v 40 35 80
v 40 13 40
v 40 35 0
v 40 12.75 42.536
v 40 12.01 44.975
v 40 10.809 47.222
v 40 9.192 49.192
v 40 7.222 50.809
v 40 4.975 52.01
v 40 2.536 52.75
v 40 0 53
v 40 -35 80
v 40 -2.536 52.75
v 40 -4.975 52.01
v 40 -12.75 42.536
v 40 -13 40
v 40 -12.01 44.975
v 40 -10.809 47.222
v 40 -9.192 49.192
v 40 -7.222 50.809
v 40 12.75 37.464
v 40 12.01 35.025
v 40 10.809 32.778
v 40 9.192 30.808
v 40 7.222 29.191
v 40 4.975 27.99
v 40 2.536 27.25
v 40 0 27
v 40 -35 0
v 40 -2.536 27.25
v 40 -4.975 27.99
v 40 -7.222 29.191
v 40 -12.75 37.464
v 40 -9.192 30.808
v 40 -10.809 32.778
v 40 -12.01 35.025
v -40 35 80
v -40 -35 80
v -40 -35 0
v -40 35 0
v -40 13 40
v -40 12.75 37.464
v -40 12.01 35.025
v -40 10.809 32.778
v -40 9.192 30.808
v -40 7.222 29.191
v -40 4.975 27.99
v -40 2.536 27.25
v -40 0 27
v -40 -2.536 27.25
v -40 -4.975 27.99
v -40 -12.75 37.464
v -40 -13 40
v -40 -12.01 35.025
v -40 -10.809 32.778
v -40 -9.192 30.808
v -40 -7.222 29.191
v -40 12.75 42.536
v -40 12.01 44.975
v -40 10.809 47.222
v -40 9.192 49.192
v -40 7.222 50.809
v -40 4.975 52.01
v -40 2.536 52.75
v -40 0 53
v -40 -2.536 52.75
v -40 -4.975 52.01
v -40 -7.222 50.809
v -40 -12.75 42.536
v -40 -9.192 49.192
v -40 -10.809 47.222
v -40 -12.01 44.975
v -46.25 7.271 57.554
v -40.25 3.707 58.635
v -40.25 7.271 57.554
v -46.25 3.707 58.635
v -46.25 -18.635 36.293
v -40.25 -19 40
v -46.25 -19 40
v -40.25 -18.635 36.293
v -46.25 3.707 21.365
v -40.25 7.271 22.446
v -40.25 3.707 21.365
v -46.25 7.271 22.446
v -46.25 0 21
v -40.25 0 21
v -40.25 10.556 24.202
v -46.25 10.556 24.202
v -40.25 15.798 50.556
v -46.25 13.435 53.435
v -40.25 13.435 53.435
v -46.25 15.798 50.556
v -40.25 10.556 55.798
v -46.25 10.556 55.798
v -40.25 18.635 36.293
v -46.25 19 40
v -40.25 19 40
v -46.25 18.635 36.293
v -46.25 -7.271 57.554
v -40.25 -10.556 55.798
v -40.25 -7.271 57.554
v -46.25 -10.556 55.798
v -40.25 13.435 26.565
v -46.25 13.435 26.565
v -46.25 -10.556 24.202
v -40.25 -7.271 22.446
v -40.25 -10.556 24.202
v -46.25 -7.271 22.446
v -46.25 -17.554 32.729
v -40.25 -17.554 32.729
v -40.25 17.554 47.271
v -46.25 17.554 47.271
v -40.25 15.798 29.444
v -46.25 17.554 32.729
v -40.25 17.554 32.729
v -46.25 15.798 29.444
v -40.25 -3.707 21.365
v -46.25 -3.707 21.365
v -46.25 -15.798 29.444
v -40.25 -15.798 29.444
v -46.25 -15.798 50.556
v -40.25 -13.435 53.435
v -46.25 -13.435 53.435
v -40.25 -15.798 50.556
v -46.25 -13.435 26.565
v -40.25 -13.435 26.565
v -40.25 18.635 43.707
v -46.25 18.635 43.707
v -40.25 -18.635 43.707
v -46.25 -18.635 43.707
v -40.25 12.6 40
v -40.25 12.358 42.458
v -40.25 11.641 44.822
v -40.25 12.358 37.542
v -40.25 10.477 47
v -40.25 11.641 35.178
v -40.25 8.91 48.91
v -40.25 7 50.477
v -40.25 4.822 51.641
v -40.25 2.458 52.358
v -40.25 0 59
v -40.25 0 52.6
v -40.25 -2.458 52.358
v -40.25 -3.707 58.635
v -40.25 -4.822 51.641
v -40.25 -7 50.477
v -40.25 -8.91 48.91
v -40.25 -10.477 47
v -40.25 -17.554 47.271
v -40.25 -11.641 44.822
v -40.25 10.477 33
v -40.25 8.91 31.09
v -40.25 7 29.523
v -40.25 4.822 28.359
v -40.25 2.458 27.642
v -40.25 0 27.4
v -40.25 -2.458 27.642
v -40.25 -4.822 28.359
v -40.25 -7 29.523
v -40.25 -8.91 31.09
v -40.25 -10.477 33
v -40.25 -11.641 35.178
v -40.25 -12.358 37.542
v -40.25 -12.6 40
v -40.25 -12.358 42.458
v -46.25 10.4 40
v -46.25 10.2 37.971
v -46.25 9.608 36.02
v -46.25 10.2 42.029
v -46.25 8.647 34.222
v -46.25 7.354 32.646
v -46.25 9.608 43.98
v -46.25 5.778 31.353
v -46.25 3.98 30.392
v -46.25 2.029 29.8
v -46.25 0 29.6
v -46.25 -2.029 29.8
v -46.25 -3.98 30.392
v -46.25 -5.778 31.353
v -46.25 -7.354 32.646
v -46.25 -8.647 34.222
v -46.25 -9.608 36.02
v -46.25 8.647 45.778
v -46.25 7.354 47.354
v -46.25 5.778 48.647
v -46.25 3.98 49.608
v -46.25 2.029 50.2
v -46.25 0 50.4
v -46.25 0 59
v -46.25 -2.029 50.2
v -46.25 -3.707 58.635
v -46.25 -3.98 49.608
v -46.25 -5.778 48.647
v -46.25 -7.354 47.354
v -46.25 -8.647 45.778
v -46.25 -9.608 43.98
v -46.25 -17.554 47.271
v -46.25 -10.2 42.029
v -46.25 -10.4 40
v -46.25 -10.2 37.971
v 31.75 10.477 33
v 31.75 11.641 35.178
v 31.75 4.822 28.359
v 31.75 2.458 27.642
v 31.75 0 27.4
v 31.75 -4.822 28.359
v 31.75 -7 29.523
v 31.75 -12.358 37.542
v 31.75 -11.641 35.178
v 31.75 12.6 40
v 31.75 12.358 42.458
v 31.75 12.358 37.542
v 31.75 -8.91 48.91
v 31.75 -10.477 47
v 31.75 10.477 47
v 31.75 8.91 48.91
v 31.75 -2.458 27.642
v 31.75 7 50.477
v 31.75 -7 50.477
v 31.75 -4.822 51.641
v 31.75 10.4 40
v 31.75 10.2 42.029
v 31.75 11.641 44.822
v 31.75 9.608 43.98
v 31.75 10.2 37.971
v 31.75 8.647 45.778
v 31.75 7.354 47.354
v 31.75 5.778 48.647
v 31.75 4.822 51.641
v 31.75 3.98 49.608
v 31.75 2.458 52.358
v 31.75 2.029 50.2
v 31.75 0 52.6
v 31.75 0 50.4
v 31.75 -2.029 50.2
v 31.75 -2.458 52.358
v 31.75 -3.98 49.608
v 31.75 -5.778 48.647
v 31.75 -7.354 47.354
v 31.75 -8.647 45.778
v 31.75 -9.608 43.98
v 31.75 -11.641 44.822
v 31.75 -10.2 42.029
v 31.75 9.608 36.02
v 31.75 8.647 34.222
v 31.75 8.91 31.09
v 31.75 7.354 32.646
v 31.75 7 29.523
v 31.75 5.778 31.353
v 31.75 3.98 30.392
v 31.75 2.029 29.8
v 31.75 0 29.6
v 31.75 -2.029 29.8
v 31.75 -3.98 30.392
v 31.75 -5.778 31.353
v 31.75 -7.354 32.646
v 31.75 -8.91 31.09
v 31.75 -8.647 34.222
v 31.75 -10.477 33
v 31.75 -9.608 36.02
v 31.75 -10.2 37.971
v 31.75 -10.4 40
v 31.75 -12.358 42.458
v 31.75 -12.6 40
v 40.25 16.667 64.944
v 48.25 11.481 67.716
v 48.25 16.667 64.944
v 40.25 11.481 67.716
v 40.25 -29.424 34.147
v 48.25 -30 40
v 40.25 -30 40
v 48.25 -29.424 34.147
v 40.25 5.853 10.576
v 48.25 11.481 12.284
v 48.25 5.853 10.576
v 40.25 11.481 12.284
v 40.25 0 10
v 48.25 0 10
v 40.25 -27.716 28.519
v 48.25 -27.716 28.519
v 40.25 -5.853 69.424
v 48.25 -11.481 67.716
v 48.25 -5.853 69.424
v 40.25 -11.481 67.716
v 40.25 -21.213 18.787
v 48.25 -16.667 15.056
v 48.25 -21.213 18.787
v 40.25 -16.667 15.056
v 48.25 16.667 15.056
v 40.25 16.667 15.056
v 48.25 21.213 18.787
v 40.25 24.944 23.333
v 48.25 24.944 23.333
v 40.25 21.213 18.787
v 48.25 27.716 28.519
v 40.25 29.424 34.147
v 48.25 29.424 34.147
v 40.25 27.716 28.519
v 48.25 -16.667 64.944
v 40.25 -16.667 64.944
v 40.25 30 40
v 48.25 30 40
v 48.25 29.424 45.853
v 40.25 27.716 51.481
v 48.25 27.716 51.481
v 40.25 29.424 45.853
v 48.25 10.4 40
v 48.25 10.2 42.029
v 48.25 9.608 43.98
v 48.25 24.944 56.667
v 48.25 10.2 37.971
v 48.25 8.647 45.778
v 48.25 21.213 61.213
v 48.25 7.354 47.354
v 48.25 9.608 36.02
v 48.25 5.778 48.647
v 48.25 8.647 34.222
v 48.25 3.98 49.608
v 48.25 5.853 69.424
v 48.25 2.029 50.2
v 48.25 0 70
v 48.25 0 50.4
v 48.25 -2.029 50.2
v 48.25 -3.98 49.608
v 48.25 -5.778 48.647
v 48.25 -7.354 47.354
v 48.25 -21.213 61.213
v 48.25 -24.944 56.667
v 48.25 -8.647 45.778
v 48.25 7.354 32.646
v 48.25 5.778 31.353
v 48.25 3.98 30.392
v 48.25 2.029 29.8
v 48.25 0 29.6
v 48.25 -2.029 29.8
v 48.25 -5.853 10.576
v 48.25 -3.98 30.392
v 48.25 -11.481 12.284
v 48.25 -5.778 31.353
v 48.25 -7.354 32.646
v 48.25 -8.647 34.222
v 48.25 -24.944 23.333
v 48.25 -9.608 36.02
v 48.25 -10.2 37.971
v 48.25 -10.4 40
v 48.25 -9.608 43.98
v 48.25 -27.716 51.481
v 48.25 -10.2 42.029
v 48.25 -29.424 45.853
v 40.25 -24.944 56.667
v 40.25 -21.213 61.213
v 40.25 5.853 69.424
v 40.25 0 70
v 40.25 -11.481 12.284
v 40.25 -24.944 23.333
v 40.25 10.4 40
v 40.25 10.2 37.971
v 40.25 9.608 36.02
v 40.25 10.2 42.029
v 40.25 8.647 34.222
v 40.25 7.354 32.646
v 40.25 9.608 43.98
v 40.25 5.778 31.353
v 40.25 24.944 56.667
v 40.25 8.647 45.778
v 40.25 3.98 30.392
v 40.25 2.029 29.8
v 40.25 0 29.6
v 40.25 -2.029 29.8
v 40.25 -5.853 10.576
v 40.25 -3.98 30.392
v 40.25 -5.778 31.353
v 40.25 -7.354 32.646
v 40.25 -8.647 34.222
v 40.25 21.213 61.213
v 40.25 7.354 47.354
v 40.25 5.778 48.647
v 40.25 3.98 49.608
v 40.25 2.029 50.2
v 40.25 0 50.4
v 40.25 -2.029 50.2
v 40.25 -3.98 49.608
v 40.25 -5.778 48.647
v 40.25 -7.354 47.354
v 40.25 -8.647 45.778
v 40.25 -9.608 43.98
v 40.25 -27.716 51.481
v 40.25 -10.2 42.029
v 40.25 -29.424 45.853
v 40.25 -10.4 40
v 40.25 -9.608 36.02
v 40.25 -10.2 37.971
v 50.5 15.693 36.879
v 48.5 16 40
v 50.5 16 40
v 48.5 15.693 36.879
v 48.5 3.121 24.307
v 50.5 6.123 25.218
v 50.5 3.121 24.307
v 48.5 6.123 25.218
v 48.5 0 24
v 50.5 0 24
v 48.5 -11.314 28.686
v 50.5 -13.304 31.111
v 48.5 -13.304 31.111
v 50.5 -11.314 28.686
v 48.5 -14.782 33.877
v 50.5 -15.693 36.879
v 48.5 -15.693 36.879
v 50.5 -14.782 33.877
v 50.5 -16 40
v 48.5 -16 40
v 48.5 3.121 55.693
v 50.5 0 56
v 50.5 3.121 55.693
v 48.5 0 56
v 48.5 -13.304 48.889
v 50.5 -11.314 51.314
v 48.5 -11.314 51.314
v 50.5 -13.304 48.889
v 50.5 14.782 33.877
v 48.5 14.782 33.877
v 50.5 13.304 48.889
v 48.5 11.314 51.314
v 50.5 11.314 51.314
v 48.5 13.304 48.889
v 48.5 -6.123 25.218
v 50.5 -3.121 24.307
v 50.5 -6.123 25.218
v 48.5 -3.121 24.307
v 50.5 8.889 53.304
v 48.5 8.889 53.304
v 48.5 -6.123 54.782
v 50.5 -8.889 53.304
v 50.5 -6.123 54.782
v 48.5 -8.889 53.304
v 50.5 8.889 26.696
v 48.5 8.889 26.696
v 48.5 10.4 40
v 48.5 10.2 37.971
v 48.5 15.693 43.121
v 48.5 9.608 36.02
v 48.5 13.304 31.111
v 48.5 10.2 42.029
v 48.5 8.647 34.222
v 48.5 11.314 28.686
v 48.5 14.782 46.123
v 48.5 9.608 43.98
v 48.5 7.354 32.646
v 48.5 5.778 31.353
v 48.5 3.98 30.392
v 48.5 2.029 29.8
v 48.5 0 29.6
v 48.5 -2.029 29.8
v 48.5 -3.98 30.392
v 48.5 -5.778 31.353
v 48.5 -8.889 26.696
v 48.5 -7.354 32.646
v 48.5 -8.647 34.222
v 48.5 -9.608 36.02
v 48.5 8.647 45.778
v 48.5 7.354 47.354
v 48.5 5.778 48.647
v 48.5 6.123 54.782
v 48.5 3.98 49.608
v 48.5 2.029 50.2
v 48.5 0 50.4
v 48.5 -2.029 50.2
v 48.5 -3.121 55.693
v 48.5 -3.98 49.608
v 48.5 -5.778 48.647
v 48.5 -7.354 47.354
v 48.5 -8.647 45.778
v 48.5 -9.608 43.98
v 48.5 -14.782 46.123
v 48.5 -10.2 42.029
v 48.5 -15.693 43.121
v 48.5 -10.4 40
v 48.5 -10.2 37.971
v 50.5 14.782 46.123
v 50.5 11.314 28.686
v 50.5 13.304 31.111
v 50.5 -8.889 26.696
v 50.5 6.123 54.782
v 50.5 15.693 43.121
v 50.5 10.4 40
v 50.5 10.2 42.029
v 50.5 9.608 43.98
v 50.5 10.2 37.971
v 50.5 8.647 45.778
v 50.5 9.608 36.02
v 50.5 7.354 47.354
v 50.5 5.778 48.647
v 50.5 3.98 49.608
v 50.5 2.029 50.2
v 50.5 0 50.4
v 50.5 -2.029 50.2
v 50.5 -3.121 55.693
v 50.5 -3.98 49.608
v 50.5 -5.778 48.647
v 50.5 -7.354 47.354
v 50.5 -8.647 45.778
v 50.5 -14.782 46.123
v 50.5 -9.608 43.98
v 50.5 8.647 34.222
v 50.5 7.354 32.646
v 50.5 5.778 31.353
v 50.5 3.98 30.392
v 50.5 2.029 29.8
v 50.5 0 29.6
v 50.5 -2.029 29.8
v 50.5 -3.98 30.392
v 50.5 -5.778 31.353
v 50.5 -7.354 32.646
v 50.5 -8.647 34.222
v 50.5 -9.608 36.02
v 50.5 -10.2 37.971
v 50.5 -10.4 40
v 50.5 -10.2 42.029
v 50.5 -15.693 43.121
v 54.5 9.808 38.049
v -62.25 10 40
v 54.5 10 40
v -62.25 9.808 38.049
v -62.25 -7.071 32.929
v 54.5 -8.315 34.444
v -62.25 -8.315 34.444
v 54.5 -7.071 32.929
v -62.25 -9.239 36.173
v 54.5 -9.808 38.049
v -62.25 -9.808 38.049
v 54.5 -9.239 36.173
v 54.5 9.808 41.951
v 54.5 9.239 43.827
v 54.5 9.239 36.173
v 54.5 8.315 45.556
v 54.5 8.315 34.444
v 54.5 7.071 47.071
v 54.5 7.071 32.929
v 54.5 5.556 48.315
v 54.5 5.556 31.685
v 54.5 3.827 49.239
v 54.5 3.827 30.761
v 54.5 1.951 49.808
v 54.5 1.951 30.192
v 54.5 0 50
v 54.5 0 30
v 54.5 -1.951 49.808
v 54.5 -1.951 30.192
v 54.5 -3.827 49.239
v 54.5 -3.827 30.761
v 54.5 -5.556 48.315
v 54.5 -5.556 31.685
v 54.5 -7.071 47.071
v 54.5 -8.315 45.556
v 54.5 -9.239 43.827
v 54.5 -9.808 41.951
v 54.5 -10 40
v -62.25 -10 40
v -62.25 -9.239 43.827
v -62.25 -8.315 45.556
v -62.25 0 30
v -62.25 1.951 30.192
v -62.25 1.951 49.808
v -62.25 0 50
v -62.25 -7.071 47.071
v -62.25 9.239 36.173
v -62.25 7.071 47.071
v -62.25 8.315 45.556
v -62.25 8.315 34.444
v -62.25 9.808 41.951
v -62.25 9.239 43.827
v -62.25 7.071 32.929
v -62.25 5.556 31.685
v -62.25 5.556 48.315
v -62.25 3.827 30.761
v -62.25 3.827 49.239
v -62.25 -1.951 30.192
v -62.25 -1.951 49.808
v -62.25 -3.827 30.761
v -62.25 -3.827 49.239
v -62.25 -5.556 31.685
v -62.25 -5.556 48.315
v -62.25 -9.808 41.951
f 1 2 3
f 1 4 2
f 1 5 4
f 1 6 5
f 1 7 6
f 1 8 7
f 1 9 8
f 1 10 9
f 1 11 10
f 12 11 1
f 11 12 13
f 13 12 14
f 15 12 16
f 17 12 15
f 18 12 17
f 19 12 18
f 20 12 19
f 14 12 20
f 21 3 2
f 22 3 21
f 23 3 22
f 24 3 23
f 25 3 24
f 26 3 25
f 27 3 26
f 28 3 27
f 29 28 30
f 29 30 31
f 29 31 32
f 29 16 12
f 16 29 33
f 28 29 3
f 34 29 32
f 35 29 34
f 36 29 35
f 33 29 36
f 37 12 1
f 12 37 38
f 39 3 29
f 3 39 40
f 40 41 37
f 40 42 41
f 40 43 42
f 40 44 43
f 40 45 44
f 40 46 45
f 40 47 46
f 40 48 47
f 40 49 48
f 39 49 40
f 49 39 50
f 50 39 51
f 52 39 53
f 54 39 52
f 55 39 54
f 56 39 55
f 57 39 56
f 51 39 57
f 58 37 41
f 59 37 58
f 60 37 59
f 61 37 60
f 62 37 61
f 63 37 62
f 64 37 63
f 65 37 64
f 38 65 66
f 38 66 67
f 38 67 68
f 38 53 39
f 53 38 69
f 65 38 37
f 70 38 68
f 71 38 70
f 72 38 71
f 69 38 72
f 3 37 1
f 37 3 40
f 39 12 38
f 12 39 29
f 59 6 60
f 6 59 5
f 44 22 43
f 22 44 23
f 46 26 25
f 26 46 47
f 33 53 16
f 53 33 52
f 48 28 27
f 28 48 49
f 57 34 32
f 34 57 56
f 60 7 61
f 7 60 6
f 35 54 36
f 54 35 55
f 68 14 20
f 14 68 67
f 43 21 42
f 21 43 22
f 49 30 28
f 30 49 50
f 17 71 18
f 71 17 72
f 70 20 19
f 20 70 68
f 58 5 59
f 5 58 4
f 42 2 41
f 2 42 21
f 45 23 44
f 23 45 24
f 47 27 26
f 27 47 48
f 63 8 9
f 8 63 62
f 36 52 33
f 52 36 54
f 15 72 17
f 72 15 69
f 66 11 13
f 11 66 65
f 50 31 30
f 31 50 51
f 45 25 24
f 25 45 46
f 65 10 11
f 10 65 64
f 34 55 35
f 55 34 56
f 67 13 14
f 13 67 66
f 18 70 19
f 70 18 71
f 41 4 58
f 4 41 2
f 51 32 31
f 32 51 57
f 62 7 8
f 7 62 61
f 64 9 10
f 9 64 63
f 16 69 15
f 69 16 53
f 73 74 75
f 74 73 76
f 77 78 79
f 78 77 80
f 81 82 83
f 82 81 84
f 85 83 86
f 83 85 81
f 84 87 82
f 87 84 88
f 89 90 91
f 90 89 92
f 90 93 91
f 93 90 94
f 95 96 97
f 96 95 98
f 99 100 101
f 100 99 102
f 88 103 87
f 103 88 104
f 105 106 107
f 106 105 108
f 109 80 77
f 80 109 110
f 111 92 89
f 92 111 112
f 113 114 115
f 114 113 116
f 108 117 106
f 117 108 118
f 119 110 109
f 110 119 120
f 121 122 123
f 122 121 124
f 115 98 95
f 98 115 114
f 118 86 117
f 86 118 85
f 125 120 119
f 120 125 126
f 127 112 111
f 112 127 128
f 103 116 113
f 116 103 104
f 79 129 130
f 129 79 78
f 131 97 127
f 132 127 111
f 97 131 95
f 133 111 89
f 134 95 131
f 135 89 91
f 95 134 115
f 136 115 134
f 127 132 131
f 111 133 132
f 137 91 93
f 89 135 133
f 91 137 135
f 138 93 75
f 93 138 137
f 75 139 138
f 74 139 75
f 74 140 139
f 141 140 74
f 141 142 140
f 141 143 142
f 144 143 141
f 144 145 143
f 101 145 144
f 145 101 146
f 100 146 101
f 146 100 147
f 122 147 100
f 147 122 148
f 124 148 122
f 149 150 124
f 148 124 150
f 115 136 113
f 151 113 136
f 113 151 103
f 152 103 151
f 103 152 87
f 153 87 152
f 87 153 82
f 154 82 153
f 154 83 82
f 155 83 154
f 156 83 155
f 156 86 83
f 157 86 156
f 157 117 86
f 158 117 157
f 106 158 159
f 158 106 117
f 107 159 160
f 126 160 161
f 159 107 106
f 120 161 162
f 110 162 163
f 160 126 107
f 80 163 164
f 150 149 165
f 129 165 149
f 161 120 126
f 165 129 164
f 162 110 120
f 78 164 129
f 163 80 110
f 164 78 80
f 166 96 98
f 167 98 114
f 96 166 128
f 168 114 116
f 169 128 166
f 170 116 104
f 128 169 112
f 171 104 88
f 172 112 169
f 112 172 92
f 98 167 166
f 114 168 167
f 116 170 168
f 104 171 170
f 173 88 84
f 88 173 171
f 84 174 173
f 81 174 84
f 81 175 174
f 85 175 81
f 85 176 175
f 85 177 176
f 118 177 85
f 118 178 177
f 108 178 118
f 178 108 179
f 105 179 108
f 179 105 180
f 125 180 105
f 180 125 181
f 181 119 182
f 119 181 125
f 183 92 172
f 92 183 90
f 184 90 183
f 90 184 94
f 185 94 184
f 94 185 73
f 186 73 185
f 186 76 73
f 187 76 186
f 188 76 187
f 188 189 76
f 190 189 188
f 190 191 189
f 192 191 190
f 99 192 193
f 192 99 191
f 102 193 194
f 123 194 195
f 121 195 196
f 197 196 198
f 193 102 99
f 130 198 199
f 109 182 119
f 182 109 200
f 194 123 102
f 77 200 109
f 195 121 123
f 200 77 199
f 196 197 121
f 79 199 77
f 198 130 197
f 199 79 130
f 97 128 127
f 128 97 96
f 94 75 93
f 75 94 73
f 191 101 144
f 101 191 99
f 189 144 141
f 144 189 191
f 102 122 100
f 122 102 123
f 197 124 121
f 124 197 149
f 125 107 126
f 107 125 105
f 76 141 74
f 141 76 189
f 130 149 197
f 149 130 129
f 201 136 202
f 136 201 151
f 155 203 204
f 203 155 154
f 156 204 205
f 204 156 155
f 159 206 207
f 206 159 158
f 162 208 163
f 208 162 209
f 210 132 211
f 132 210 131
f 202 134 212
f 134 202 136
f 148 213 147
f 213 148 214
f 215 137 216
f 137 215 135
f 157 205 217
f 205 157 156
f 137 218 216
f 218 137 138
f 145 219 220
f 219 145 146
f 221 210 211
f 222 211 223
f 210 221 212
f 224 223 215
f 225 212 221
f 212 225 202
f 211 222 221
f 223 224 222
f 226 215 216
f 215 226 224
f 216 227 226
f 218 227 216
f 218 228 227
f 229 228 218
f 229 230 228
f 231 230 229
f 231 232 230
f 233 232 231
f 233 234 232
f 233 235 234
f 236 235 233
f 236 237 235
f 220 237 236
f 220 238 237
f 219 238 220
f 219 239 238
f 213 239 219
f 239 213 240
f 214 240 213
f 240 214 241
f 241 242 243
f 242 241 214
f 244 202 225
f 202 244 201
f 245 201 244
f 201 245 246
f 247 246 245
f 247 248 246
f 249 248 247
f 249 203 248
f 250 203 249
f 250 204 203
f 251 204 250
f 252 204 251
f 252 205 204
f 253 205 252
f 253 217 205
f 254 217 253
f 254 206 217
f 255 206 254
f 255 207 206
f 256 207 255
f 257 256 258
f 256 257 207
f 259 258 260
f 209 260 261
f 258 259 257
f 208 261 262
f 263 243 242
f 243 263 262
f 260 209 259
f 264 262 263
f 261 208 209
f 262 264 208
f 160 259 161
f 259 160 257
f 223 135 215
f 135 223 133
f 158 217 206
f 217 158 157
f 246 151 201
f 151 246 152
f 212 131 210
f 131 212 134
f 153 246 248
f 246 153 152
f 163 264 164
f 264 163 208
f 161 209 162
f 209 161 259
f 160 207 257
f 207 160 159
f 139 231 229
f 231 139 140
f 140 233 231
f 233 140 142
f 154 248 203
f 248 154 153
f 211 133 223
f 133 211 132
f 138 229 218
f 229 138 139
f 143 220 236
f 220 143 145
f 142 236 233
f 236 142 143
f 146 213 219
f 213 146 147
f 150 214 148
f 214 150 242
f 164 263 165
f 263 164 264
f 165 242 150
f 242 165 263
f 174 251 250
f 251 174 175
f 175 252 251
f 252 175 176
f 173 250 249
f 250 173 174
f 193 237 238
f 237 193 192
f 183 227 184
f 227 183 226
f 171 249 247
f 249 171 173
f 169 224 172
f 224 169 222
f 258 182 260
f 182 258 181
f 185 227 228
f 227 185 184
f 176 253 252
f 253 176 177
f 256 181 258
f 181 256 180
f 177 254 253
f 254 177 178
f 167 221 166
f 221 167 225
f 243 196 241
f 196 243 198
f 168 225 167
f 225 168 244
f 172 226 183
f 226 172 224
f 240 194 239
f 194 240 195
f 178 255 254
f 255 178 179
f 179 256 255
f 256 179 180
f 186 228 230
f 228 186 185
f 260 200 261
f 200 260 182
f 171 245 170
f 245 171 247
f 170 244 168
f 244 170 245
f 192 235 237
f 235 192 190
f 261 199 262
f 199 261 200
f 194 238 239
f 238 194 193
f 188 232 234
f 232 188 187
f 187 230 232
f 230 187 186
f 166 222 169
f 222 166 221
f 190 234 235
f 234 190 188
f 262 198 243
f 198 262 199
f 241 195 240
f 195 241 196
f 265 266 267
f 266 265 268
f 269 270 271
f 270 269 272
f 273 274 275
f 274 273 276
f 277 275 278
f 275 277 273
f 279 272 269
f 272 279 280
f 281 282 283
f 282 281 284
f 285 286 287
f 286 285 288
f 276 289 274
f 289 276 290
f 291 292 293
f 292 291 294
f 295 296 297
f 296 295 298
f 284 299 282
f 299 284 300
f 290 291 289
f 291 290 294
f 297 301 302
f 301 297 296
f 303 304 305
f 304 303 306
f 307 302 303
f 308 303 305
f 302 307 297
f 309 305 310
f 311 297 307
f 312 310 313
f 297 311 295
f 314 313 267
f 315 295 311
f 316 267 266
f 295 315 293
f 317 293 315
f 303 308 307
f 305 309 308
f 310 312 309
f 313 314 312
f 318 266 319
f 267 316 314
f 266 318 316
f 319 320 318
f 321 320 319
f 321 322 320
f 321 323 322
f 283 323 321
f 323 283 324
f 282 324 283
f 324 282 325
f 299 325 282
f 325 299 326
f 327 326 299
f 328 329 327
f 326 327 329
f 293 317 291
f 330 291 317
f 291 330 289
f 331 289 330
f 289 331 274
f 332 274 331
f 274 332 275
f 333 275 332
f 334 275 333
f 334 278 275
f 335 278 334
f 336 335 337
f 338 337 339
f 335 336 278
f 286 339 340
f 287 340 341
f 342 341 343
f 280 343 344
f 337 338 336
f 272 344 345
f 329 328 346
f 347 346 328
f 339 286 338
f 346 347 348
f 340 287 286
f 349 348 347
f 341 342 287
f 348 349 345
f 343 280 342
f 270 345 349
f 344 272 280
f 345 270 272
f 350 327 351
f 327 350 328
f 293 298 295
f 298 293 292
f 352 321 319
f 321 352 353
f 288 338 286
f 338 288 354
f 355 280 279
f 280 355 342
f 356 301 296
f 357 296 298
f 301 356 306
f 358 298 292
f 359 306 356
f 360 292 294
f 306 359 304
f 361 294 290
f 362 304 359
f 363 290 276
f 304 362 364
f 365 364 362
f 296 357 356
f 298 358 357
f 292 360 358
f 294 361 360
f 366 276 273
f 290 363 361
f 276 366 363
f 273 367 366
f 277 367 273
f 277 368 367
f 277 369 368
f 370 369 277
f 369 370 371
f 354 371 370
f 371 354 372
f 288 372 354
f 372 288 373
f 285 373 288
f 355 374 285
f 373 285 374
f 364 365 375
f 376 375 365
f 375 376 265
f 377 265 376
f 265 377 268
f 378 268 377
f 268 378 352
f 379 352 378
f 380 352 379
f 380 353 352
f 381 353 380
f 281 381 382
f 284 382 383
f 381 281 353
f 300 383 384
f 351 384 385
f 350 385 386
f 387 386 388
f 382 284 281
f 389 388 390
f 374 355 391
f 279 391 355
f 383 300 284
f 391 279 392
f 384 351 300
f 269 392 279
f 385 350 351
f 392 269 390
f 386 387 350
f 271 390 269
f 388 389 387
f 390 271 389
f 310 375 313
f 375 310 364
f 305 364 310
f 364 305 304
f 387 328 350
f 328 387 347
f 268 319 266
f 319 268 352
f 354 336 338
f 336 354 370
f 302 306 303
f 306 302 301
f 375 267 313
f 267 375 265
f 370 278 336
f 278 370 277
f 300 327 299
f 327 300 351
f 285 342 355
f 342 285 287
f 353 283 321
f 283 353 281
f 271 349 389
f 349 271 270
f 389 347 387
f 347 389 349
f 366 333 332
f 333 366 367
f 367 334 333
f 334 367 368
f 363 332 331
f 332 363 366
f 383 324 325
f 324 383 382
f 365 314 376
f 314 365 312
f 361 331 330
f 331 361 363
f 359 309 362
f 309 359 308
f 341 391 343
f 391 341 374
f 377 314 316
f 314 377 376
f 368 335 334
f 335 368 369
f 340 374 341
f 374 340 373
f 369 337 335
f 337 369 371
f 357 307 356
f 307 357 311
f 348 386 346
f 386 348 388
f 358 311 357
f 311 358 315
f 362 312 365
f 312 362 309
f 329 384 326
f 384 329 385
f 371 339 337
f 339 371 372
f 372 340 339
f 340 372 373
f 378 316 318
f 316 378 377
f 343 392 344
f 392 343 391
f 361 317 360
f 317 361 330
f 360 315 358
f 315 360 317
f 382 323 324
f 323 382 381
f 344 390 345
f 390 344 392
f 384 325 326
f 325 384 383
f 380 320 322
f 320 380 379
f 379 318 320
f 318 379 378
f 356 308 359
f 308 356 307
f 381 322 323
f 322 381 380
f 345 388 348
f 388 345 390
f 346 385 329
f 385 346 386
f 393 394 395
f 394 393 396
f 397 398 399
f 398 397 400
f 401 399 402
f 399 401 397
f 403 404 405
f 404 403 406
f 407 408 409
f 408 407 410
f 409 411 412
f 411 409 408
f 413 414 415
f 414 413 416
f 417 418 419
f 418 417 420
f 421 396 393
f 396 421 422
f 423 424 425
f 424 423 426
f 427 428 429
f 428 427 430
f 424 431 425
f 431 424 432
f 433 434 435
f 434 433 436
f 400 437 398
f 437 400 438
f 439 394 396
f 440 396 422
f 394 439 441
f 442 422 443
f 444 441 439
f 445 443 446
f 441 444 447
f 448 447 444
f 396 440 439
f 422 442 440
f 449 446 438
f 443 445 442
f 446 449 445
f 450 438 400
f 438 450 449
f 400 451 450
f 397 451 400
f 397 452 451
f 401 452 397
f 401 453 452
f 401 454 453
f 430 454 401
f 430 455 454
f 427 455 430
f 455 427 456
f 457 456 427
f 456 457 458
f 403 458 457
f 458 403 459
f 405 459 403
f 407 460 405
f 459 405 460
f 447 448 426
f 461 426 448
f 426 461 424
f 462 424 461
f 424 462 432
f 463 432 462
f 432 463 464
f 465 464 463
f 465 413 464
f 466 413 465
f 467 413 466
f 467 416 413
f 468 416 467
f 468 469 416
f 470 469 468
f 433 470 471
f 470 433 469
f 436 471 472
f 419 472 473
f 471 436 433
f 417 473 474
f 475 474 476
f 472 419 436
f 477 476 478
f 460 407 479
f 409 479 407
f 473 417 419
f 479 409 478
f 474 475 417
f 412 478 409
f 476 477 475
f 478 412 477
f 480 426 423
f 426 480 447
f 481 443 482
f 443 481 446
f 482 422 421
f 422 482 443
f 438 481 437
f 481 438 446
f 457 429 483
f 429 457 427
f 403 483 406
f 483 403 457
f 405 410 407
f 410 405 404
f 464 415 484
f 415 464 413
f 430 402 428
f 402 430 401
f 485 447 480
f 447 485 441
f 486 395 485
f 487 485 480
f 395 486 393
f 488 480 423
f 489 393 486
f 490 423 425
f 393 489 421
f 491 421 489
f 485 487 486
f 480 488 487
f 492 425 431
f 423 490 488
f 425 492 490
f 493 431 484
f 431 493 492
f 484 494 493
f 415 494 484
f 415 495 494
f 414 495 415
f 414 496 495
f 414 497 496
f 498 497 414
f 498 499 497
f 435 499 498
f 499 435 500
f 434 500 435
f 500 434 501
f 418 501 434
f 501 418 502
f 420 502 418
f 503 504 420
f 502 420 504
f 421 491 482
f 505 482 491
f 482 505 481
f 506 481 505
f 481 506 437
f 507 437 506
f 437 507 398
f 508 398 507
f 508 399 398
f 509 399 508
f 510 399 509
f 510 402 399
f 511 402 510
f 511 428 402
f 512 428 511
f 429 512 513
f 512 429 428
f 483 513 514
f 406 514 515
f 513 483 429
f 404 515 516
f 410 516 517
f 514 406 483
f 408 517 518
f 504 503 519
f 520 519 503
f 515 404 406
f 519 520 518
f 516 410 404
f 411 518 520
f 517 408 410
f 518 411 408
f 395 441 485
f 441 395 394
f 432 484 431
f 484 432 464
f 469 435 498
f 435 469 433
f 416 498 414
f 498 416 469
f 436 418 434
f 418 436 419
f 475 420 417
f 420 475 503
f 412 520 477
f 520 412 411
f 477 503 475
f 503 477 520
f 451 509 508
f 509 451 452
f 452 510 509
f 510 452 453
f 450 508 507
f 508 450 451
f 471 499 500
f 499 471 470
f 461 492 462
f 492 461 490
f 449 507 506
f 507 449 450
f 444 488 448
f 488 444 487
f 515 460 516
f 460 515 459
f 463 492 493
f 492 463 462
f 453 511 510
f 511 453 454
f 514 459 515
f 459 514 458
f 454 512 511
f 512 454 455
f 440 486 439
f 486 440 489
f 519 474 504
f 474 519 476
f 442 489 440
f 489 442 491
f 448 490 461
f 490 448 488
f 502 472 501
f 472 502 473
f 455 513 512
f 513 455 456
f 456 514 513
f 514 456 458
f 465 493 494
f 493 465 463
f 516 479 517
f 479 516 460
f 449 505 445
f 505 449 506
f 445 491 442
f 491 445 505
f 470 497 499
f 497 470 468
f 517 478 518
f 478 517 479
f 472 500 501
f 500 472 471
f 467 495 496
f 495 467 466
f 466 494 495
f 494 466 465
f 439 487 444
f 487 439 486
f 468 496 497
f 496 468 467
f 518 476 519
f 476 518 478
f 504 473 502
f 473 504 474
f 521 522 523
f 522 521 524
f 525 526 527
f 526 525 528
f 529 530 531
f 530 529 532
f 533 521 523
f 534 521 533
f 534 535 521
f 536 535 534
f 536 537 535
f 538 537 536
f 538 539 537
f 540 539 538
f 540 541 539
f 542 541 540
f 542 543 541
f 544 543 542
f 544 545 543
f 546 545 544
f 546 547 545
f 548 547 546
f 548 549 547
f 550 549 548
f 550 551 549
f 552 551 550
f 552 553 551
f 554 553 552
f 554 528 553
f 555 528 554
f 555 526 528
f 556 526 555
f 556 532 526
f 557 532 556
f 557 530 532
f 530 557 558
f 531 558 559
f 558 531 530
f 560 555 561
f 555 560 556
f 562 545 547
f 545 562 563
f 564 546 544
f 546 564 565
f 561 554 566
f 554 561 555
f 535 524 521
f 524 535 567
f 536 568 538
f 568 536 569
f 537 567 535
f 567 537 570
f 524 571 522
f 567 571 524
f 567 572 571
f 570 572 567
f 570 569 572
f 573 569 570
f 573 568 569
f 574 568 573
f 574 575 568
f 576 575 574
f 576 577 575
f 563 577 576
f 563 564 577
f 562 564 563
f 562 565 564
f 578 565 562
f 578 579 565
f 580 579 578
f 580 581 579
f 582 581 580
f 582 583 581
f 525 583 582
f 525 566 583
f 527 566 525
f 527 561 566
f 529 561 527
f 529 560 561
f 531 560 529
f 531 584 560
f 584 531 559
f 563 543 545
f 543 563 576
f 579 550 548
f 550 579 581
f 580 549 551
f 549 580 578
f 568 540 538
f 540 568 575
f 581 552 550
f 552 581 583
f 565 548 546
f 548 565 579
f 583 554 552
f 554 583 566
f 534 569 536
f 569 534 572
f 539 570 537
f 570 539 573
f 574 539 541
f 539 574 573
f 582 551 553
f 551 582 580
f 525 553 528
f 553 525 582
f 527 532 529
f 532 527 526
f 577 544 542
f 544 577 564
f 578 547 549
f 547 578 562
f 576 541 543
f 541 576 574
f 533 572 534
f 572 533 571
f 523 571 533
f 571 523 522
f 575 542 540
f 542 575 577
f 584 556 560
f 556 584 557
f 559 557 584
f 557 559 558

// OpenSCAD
$fn = 32;

// ------------------------------------------------------------------------
// Bushed housing: 80 x 70 x 80 mm housing, bushing d25.2
// Every part is its own module, assembly() places them once.
// ------------------------------------------------------------------------

// --- part 1 ---
module housing() {
  difference() {
    translate([-40, -35, 0]) cube([80, 70, 80]);
    translate([0, 0, 40]) rotate([0, 90, 0]) cylinder(h = 82, d = 26, center = true);
  }
}

// --- part 2 ---
module bushing() {
  difference() {
    union() {
      cylinder(h = 6, d = 38);
      translate([0, 0, 6]) cylinder(h = 72, d = 25.2);
    }
    translate([0, 0, -1]) cylinder(h = 80, d = 20.8);
  }
}

// --- part 3 ---
module shaft() {
  translate([0, 0, -58.375]) cylinder(h = 116.75, d = 20);
}

// --- part 4 ---
module cover() {
  difference() {
    cylinder(h = 8, d = 60);
    translate([0, 0, -1]) cylinder(h = 10, d = 20.8);
  }
}

// --- part 5 ---
module washer() {
  difference() {
      translate([0, 0, 0]) cylinder(h = 2, d = 32);
      translate([0, 0, -1]) cylinder(h = 4, d = 20.8);
    }
}

// --- assembly ---
module assembly() {
  translate([0, 0, 0]) rotate([0, 0, 0]) housing();
  translate([-46.25, 0, 40]) rotate([0, 90, 0]) bushing();
  translate([-3.875, 0, 40]) rotate([0, 90, 0]) shaft();
  translate([40.25, 0, 40]) rotate([0, 90, 0]) cover();
  translate([48.5, 0, 40]) rotate([0, 90, 0]) washer();
}

assembly();
